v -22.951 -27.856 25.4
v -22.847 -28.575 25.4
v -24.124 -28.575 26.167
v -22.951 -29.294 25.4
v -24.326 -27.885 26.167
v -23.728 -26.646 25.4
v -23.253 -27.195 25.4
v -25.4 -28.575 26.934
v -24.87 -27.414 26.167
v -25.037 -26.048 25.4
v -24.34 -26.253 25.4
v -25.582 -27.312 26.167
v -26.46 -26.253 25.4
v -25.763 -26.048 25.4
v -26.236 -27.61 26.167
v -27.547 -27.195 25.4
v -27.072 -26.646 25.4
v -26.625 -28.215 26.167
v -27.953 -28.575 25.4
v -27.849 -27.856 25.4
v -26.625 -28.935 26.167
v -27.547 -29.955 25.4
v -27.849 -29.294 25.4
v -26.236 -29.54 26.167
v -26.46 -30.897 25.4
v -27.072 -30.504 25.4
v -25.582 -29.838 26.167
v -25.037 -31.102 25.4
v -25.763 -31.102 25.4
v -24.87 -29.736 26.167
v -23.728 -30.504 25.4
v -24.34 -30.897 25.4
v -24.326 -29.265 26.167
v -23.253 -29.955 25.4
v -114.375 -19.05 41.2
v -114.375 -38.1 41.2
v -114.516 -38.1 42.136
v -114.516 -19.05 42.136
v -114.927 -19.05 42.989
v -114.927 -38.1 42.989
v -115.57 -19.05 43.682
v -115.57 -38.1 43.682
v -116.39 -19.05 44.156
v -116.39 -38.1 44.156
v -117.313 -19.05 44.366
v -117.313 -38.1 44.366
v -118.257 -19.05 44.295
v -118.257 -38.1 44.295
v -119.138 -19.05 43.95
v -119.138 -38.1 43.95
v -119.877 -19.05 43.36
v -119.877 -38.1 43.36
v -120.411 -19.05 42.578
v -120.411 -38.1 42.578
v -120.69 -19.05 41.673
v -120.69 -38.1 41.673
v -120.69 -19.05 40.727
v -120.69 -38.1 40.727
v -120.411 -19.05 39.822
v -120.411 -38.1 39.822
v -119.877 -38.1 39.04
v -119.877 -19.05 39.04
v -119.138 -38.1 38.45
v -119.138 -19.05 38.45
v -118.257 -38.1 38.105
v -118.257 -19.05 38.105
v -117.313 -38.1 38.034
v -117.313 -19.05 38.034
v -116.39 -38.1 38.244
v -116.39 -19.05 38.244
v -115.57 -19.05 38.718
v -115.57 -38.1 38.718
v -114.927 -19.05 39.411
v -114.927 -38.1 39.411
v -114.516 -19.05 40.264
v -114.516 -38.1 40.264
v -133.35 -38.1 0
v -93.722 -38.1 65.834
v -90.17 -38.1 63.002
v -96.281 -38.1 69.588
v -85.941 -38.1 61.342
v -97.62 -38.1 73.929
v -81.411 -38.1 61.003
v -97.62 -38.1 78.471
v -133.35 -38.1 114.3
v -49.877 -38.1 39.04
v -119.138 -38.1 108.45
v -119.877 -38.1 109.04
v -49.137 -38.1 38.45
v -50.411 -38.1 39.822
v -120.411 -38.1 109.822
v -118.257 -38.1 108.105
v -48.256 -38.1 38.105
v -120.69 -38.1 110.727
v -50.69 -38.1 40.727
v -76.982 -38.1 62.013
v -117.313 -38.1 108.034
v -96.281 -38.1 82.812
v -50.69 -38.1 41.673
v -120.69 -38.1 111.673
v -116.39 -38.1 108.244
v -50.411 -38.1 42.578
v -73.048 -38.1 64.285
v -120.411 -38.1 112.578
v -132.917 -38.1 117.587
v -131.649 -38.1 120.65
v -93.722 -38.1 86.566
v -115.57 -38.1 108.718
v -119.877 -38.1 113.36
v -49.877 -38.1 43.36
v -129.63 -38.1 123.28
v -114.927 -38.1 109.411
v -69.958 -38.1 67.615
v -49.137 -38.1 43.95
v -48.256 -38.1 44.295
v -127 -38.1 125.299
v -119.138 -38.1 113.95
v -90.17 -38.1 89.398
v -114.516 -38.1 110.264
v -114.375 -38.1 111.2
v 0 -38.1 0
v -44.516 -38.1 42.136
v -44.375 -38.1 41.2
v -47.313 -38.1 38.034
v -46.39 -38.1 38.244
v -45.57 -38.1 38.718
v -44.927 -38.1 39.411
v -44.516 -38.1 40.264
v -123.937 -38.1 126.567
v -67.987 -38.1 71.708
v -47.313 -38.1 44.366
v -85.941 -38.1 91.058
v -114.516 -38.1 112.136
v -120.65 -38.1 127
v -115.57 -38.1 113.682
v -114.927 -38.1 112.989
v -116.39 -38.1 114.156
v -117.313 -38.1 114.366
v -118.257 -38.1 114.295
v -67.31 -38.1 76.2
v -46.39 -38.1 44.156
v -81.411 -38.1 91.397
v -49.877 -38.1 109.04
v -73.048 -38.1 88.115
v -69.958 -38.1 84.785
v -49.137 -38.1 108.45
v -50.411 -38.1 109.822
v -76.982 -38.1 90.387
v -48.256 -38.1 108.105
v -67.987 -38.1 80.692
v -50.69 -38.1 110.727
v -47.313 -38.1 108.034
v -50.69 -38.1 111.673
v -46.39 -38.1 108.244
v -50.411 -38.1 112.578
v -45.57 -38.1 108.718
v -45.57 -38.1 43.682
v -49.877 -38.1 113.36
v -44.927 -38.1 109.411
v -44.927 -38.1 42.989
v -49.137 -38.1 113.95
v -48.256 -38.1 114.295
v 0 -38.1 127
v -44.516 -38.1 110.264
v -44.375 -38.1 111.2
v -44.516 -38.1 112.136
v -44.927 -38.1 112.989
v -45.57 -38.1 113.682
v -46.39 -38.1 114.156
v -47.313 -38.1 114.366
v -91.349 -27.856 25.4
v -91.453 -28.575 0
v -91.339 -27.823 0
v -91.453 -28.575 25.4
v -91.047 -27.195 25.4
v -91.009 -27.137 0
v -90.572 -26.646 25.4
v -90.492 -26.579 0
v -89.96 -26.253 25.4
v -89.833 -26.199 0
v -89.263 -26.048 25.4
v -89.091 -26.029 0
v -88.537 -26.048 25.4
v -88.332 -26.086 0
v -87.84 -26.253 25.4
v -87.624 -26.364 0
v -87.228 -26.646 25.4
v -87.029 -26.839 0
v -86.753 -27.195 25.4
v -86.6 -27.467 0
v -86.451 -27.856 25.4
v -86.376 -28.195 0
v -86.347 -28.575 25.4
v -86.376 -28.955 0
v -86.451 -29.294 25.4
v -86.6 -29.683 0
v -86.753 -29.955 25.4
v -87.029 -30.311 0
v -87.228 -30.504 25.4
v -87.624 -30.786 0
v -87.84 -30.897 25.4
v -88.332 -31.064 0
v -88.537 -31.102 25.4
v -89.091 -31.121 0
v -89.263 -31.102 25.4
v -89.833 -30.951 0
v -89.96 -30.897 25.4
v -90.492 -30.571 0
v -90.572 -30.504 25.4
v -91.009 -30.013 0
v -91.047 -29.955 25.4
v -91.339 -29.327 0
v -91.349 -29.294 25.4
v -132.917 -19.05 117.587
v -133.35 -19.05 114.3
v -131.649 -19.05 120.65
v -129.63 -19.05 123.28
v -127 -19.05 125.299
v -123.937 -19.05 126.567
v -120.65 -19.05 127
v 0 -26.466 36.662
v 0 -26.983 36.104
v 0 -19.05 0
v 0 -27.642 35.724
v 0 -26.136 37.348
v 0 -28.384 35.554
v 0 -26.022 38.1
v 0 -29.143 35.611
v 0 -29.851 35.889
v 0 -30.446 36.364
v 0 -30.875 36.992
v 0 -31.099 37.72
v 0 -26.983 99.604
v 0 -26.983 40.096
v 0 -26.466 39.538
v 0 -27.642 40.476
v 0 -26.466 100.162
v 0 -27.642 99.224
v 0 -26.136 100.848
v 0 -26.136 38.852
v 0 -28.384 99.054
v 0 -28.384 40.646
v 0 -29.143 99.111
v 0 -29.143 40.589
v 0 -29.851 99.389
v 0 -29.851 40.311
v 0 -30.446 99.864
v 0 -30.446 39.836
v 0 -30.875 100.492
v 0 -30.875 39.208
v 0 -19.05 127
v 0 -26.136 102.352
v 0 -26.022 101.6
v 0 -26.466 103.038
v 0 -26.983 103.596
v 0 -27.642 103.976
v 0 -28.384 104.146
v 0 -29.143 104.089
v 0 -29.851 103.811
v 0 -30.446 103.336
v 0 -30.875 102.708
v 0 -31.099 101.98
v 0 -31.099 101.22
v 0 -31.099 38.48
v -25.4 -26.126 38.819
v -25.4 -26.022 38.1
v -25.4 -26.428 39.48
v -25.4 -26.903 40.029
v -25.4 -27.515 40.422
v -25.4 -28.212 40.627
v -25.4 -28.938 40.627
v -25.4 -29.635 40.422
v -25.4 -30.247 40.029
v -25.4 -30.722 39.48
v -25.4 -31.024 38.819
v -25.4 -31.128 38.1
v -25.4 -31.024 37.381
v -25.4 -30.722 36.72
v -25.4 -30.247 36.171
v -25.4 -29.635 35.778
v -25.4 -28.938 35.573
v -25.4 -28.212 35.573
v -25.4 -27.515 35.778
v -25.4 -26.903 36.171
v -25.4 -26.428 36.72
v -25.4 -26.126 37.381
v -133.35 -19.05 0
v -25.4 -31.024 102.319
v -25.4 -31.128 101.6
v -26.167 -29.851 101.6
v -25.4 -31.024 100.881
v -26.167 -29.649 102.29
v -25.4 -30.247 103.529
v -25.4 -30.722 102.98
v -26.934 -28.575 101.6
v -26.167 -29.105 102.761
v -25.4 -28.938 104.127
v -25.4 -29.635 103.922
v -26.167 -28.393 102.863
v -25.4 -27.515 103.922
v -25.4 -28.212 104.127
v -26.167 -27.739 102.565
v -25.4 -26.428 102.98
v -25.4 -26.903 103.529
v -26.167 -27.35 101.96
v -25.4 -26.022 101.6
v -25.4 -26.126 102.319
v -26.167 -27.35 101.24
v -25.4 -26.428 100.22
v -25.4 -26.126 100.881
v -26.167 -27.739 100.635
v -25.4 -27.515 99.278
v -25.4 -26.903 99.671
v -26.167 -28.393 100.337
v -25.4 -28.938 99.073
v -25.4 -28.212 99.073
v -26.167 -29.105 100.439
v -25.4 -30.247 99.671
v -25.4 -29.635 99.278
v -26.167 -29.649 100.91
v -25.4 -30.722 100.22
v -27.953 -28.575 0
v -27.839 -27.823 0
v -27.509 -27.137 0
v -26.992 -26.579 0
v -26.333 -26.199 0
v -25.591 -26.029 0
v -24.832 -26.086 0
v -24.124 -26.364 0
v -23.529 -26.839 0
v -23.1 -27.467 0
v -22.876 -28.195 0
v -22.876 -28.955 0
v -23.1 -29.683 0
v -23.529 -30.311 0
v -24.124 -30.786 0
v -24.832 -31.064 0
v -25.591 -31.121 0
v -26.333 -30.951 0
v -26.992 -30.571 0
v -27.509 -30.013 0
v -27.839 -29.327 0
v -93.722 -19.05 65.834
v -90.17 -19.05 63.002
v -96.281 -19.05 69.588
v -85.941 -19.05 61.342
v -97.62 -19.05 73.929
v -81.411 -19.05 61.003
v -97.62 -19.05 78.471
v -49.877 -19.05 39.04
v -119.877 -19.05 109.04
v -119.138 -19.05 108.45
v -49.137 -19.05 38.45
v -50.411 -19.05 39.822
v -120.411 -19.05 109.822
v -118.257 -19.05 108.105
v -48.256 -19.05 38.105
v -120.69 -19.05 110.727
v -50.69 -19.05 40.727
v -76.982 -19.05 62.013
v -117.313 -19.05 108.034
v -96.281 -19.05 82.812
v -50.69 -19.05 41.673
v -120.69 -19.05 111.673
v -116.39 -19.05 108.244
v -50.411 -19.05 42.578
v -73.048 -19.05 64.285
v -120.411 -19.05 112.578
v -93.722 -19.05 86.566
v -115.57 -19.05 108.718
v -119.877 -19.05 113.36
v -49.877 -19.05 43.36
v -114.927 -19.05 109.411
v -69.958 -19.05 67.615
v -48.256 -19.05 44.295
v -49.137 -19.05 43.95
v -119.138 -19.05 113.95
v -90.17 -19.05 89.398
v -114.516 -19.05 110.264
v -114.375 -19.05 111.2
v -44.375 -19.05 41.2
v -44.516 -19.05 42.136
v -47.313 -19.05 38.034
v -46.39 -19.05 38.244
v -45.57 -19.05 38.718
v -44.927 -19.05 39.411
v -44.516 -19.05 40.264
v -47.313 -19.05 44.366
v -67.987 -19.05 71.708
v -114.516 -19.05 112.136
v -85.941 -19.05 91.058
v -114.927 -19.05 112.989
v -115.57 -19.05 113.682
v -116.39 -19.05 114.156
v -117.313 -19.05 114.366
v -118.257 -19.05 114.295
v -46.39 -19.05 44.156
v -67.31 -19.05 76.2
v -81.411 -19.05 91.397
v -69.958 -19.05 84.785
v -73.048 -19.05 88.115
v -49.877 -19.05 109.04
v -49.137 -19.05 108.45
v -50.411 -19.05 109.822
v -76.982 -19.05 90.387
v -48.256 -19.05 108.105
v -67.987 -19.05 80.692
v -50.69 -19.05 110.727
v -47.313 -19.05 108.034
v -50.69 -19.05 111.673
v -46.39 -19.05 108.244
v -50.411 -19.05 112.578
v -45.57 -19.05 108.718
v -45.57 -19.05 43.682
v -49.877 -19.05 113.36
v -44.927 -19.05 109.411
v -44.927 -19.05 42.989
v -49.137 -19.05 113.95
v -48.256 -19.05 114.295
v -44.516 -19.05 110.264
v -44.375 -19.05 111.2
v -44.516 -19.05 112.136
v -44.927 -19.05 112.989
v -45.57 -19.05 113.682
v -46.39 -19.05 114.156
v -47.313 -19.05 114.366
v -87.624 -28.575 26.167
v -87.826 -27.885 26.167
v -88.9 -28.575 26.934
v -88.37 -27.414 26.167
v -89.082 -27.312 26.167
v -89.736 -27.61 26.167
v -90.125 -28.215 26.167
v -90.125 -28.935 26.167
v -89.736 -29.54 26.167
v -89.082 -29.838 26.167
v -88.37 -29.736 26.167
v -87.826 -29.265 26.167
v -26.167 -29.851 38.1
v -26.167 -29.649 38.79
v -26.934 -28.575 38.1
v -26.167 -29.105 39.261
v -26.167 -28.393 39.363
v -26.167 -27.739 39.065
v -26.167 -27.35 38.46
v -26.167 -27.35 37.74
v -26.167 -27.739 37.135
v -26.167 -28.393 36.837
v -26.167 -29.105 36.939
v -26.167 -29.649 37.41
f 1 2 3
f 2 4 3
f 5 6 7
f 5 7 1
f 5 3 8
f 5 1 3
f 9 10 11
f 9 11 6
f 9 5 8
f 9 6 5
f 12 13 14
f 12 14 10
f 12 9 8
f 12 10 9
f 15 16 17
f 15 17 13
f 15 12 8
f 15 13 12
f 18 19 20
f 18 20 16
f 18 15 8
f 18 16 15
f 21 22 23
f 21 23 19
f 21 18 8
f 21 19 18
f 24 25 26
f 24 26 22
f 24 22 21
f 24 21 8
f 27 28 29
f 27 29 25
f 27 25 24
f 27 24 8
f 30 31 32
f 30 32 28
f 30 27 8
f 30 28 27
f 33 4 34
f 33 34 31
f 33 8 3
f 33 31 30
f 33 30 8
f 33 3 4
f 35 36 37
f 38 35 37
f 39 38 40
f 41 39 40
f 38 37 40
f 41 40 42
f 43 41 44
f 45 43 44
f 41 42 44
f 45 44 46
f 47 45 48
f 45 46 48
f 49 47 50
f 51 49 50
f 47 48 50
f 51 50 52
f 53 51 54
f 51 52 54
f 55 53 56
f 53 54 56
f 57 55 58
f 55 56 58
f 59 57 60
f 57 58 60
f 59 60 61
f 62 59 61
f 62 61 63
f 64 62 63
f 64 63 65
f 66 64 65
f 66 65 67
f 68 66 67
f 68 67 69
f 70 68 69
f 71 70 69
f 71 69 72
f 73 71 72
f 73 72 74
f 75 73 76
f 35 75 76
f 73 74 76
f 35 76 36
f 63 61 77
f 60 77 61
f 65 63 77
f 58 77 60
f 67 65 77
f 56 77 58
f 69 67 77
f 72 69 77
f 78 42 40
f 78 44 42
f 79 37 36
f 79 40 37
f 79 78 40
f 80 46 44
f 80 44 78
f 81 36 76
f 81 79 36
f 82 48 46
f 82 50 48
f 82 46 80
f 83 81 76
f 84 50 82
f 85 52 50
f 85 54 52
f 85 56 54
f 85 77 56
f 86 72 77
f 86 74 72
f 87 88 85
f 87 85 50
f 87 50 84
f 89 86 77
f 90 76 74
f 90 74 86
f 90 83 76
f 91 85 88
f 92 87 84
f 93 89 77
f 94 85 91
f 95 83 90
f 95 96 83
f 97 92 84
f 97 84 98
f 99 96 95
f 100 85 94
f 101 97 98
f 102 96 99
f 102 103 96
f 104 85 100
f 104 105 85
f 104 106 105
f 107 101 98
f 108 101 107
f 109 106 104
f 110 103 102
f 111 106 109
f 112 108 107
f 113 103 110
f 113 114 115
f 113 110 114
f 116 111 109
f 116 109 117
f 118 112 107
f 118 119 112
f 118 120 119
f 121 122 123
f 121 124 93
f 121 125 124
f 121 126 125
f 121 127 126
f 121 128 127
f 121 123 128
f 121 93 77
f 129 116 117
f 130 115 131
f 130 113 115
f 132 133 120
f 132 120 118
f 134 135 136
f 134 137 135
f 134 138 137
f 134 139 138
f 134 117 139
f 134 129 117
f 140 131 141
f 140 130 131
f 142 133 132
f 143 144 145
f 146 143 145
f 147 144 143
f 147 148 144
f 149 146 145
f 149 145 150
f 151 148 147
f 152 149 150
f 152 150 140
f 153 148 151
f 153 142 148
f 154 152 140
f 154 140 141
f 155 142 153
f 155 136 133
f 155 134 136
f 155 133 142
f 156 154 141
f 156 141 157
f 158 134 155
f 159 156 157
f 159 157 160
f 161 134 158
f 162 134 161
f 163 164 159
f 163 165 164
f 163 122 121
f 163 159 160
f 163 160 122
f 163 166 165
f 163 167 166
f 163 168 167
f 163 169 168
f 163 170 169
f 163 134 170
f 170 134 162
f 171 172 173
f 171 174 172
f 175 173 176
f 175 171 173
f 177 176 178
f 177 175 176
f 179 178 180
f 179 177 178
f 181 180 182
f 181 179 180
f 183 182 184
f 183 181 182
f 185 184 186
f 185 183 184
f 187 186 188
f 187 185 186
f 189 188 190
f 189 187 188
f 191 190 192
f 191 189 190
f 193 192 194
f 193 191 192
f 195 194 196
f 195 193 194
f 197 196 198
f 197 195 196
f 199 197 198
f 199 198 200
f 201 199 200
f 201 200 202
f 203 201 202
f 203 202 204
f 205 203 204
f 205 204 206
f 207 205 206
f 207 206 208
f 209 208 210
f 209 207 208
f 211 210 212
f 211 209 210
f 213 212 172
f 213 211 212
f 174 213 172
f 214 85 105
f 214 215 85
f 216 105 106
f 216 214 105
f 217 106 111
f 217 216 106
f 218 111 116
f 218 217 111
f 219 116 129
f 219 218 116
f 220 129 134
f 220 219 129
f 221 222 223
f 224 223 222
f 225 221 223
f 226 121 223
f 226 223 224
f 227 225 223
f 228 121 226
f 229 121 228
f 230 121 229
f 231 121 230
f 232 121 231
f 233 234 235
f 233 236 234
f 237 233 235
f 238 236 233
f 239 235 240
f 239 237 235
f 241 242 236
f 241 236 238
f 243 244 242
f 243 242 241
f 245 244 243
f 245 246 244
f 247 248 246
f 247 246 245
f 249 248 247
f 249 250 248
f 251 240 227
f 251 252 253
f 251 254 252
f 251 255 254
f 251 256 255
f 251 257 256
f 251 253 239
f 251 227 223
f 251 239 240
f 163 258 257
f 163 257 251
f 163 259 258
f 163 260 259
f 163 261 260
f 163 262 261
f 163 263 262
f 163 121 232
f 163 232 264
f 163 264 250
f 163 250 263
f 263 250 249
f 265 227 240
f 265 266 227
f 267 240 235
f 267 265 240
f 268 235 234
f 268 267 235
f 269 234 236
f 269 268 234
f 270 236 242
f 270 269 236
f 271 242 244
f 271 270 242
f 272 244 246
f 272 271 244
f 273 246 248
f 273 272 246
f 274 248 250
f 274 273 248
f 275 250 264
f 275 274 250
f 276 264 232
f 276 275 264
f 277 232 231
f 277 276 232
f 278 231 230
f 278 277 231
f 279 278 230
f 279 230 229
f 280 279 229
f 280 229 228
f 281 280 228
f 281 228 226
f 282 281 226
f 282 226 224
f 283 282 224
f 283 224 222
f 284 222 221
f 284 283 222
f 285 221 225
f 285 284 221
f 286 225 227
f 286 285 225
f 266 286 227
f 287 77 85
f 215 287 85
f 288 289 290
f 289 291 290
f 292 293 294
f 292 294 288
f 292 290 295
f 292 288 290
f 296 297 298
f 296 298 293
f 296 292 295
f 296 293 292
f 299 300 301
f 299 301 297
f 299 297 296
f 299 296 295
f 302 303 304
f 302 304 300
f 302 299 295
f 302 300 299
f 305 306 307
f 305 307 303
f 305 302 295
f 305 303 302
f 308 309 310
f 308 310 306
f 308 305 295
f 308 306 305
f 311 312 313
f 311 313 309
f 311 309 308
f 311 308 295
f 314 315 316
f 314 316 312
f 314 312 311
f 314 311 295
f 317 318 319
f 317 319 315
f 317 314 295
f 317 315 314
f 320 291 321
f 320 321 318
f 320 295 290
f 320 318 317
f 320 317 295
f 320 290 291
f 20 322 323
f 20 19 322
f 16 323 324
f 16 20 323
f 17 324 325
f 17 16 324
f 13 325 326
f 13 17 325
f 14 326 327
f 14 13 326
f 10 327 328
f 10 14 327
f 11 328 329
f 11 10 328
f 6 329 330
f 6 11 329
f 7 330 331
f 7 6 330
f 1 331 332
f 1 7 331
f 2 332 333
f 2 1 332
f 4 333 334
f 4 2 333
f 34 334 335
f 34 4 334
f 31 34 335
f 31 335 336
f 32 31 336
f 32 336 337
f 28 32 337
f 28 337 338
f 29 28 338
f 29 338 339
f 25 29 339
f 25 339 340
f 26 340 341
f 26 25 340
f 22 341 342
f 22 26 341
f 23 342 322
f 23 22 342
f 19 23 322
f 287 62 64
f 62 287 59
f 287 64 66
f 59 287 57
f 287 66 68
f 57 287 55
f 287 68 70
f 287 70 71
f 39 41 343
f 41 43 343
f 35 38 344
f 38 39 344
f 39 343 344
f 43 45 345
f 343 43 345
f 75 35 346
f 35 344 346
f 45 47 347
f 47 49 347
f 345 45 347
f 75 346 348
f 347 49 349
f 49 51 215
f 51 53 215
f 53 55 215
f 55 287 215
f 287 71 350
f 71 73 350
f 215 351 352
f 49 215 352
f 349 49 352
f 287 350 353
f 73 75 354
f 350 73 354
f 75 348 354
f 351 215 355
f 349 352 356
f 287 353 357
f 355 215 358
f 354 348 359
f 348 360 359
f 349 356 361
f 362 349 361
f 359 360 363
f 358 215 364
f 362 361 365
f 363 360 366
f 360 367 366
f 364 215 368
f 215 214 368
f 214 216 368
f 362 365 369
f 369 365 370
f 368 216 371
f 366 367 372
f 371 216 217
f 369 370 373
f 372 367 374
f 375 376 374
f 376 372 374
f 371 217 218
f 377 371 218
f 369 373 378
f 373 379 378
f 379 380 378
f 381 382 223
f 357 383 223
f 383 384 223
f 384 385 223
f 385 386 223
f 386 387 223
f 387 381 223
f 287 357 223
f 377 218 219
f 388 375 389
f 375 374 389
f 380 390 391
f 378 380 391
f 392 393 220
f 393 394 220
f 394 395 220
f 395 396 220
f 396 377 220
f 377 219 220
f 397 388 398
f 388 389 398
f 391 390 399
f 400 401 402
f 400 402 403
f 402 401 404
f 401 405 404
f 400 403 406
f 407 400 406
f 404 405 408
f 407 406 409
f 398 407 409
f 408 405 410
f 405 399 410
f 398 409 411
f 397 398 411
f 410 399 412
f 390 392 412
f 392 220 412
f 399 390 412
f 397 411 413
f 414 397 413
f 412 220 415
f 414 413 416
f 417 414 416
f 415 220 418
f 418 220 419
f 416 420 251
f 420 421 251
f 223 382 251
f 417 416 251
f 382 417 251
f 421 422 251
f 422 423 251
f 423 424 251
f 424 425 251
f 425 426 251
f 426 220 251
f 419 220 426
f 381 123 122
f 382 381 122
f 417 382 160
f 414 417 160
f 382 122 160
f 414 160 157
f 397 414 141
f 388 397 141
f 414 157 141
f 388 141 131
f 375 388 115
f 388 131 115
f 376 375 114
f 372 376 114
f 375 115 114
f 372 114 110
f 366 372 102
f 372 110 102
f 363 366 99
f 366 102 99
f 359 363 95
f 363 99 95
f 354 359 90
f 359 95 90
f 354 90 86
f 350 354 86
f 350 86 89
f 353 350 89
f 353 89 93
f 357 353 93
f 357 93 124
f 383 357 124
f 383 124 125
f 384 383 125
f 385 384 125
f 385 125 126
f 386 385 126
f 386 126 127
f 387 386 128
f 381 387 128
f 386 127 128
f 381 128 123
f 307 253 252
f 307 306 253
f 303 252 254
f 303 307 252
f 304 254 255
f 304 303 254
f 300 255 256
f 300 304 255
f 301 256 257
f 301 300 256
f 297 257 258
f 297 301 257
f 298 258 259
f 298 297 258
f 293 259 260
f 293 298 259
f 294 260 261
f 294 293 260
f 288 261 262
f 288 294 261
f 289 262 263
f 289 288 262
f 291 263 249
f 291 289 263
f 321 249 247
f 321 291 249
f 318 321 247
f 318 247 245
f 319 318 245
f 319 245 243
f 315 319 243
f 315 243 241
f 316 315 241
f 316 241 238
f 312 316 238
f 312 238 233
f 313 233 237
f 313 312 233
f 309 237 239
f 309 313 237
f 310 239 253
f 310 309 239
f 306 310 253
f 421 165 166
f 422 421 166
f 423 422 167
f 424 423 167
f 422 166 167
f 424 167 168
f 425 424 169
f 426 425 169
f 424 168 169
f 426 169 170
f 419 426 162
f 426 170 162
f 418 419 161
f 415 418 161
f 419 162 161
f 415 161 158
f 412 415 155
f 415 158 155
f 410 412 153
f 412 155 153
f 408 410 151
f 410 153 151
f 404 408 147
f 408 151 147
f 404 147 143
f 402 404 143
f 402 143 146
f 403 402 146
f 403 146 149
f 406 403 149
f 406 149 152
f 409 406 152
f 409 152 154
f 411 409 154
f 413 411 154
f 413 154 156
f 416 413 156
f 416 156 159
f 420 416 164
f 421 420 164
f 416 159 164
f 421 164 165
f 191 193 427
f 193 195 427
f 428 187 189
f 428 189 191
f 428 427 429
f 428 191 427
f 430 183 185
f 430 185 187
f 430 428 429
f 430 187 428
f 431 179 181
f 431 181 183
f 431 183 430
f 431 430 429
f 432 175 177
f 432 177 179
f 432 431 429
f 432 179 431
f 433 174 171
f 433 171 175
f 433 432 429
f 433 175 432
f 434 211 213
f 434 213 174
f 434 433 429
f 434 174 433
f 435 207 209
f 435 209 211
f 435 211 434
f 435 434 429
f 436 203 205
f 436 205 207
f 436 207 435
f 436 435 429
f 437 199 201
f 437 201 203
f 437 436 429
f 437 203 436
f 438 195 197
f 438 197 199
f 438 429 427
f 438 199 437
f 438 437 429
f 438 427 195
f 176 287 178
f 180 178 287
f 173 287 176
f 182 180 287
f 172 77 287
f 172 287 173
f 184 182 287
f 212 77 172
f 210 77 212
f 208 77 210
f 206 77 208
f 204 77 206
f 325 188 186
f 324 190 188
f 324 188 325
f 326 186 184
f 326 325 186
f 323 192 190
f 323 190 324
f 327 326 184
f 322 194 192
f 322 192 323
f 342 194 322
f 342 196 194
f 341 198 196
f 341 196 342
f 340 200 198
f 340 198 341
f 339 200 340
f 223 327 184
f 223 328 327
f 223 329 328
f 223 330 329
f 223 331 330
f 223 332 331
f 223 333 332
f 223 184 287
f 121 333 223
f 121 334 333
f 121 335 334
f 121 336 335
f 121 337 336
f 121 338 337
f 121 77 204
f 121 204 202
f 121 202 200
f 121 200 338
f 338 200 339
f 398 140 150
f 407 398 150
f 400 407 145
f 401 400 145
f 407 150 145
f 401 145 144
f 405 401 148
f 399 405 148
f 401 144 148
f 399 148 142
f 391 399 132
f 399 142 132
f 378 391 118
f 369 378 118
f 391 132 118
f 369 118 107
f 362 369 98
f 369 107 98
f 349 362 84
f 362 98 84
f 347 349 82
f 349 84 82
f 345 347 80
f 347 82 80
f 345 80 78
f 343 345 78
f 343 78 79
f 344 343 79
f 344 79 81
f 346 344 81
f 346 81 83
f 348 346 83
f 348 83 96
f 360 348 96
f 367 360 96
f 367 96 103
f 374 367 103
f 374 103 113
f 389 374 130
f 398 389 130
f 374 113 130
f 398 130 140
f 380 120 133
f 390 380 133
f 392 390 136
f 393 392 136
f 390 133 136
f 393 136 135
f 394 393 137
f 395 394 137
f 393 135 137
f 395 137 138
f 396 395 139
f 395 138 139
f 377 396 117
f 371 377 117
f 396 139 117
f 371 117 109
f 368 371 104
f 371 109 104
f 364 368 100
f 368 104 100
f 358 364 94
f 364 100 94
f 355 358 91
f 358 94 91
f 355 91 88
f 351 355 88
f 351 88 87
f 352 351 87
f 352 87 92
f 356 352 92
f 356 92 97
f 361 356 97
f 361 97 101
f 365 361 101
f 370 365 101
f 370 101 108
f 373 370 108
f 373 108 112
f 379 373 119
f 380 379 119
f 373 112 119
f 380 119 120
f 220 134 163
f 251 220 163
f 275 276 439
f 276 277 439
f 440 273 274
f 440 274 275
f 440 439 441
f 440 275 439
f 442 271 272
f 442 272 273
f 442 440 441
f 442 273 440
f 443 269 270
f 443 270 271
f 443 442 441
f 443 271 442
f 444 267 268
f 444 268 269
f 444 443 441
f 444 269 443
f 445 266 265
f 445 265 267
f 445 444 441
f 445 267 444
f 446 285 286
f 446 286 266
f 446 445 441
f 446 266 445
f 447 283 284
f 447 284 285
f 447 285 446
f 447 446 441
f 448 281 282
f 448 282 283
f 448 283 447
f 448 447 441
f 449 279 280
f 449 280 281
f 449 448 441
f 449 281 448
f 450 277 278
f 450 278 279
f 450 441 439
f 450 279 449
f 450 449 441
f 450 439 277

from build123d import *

# Parameters (mm, degrees)
F0_W           = 133.3499997854
F0_H           = 127
F0_R           = 3.175
F0_R_2         = 15.24
F1_DEPTH       = 19.05
F4_D           = 5.1054
F4_DEPTH       = 25.4
F4_TIP         = 1.5338169022
F4_ON_F3_D     = 5.1054
F4_ON_F3_DEPTH = 25.4
F4_ON_F3_TIP   = 1.5338169022
F7_R           = 12.7


with BuildPart() as f1:
    # F0 (on Front) → F1 (new body)
    with BuildSketch(Plane.XZ):
        with Locations((-66.6749998927, 63.5)):
            Rectangle(F0_W, F0_H)
        with Locations((-117.5500062, 41.1999938)):
            Circle(F0_R, mode=Mode.SUBTRACT)
        with Locations((-47.5499938, 41.1999938)):
            Circle(F0_R, mode=Mode.SUBTRACT)
        with Locations((-82.55, 76.2)):
            Circle(F0_R_2, mode=Mode.SUBTRACT)
        with Locations((-117.5500062, 111.2000062)):
            Circle(F0_R, mode=Mode.SUBTRACT)
        with Locations((-47.5499938, 111.2000062)):
            Circle(F0_R, mode=Mode.SUBTRACT)
    extrude(amount=F1_DEPTH)

    # F4
    with Locations(Plane.YZ):
        with Locations((-9.525, 101.6), (-9.525, 38.1)):
            Hole(F4_D / 2, depth=F4_DEPTH)
            with Locations((0, 0, -(F4_DEPTH + F4_TIP / 2))):  # 118° drill point
                Cone(0, F4_D / 2, F4_TIP, mode=Mode.SUBTRACT)

    # F4 on F3
    with Locations(Plane(origin=(0, 0, 0), x_dir=(1, 0, 0), z_dir=(0, 0, -1))):
        with Locations((-25.4, 9.525), (-88.9, 9.525)):
            Hole(F4_ON_F3_D / 2, depth=F4_ON_F3_DEPTH)
            with Locations((0, 0, -(F4_ON_F3_DEPTH + F4_ON_F3_TIP / 2))):  # 118° drill point
                Cone(0, F4_ON_F3_D / 2, F4_ON_F3_TIP, mode=Mode.SUBTRACT)


with BuildPart() as f5_1:
    # F5: instance of F1
    add(f1.part.mirror(Plane(origin=(-65.8295348944, -19.05, 62.823628006), x_dir=(1, 0, 0), z_dir=(0, -1, 0))))

    # F7
    f7_edges = [f5_1.edges().sort_by_distance(p)[0] for p in [
        (-133.35, -28.575, 127),
    ]]
    fillet(f7_edges, radius=F7_R)


solid = f5_1.part
